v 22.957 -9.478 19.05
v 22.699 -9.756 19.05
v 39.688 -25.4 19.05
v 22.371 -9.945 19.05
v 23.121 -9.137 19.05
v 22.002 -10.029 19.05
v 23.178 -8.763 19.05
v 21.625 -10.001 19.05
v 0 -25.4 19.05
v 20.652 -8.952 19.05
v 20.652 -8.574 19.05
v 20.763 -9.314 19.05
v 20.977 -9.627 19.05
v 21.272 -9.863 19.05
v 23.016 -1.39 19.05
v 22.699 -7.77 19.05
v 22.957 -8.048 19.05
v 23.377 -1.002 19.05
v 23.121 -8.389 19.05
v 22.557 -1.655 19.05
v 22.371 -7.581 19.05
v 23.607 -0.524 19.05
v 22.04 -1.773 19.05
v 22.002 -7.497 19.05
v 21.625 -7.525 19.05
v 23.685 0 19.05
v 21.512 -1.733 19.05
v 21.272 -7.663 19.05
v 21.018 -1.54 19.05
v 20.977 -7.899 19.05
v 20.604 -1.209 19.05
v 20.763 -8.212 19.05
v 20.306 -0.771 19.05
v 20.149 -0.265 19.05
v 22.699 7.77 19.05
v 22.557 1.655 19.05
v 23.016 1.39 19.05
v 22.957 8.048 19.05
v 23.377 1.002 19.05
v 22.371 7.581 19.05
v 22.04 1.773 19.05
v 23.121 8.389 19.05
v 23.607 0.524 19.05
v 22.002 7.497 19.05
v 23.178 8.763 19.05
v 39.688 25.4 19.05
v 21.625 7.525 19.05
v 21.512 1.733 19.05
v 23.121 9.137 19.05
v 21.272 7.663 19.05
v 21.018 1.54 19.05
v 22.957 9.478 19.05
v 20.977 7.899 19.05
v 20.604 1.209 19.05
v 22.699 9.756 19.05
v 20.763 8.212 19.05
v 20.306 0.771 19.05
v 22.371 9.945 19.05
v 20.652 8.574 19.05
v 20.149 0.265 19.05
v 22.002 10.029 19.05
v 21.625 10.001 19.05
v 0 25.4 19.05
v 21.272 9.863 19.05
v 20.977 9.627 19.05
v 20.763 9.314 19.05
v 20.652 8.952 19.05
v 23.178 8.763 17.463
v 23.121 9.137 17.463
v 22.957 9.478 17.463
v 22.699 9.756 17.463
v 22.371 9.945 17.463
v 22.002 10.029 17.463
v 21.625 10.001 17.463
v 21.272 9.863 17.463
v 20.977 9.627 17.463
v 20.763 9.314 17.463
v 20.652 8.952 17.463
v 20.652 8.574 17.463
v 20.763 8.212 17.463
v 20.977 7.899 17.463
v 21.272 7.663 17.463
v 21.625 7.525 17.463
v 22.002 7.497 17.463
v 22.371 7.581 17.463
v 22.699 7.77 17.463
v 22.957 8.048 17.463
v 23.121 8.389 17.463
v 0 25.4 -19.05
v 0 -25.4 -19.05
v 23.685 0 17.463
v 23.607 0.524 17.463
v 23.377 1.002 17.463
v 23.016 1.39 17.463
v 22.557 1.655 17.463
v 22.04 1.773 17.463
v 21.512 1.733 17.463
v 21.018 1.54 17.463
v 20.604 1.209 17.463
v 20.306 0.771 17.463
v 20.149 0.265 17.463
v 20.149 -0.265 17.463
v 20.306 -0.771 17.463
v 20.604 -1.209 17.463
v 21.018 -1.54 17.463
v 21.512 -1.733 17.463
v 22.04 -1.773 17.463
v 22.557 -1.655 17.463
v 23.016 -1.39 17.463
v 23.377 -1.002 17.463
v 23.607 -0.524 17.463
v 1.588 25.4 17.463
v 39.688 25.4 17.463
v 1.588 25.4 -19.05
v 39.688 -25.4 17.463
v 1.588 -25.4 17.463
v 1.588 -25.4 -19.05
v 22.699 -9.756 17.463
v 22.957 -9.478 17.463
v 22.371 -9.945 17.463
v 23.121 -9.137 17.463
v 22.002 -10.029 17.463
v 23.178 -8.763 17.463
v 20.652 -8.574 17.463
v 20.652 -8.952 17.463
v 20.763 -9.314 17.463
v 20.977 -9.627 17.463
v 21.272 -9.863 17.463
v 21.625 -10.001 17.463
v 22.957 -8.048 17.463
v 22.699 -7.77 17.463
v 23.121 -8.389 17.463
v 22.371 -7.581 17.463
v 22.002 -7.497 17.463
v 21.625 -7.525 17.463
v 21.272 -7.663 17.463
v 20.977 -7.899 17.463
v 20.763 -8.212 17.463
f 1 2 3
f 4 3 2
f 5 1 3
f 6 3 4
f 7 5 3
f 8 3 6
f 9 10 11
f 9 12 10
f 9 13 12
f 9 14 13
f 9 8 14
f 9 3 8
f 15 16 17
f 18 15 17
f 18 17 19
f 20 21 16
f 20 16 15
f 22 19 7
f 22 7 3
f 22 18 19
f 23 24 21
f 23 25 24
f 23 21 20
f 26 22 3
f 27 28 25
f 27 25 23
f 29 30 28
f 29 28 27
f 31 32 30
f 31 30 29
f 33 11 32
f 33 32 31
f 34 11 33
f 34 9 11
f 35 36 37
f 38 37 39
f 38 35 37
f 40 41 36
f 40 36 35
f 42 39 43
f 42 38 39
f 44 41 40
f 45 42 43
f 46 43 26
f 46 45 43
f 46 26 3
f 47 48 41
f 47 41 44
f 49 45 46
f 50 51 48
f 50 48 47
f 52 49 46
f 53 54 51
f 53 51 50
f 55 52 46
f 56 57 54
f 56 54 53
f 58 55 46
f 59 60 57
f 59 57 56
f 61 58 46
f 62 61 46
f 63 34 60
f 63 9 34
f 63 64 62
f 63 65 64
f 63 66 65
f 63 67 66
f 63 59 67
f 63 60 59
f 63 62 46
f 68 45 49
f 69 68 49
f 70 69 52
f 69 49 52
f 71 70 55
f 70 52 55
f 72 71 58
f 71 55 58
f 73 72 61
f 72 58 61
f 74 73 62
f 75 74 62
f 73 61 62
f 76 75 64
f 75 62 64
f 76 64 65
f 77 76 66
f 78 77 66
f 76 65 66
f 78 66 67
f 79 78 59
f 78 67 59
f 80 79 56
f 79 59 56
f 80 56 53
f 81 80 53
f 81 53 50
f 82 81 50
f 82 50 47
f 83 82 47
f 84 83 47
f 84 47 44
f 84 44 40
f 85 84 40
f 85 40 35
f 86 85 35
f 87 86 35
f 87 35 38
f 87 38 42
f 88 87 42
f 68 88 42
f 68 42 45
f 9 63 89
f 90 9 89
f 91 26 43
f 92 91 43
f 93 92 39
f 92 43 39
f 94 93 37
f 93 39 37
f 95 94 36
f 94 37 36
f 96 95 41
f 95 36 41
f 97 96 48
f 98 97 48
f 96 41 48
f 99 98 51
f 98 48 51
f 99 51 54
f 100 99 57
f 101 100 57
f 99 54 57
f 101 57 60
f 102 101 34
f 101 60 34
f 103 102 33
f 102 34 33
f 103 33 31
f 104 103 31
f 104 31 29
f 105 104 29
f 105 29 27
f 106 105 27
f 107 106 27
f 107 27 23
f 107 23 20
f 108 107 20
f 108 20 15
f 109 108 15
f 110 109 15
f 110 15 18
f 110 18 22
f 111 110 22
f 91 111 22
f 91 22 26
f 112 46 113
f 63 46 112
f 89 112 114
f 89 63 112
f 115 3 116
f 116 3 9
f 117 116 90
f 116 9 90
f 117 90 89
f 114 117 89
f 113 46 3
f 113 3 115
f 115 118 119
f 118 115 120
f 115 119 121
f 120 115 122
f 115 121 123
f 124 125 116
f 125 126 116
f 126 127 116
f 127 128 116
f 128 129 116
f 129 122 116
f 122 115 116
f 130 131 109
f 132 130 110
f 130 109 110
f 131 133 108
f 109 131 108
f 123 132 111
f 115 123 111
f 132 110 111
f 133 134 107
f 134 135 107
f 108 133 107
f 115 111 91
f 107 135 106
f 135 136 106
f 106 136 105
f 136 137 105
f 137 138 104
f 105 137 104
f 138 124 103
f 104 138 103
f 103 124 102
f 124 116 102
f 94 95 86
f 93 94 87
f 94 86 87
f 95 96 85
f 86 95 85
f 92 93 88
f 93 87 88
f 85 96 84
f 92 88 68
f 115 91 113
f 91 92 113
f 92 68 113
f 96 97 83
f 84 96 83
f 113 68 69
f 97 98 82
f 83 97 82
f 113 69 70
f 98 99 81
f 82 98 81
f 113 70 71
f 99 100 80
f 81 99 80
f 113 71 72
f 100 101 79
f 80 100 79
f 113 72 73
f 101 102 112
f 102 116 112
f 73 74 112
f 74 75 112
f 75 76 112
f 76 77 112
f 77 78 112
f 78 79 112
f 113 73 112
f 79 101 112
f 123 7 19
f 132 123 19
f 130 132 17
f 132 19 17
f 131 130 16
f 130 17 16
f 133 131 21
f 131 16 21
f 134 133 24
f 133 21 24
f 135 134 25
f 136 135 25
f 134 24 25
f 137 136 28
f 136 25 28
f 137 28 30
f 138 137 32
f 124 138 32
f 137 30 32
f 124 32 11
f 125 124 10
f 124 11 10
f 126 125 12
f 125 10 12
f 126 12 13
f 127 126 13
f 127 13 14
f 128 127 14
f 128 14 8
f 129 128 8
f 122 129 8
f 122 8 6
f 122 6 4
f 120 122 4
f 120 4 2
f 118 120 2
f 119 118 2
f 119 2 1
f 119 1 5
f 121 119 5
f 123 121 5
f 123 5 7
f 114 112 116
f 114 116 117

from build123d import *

# Parameters (mm, degrees)
SKETCH2_W           = 38.1
SKETCH2_H           = 50.8
BOSS_EXTRUDE1_DEPTH = 1.5875
SKETCH3_W           = 1.5875
SKETCH3_H           = 50.8
BOSS_EXTRUDE2_DEPTH = 38.1
CUT_EXTRUDE1_REACH  = 62.596
SKETCH4_R           = 1.778
SKETCH4_R_2         = 1.27


with BuildPart() as part:
    # Sketch2 → Boss-Extrude1 (new body)
    with BuildSketch(Plane(origin=(0, 0, 0), x_dir=(0, 0, -1), z_dir=(1, 0, 0))):
        Rectangle(SKETCH2_W, SKETCH2_H)
    extrude(amount=BOSS_EXTRUDE1_DEPTH)

    # Sketch3 → Boss-Extrude2 (add)
    with BuildSketch(Plane(origin=(1.5875, 0, 0), x_dir=(0, 0, -1), z_dir=(1, 0, 0))):
        with Locations((-18.25625, 0)):
            Rectangle(SKETCH3_W, SKETCH3_H)
    extrude(amount=BOSS_EXTRUDE2_DEPTH)

    # Sketch4 → Cut-Extrude1 (cut, up to next)
    with BuildSketch(Plane.XY.offset(19.05), mode=Mode.PRIVATE) as cut_extrude1_sk1:
        with Locations((21.9075, 0)):
            Circle(SKETCH4_R)
    cut_extrude1_tool1 = extrude(cut_extrude1_sk1.sketch, amount=-CUT_EXTRUDE1_REACH, mode=Mode.PRIVATE) & part.part
    # Sketch4 → Cut-Extrude1 (cut, up to next)
    with BuildSketch(Plane.XY.offset(19.05), mode=Mode.PRIVATE) as cut_extrude1_sk2:
        with Locations((21.9075, 8.763)):
            Circle(SKETCH4_R_2)
    cut_extrude1_tool2 = extrude(cut_extrude1_sk2.sketch, amount=-CUT_EXTRUDE1_REACH, mode=Mode.PRIVATE) & part.part
    # Sketch4 → Cut-Extrude1 (cut, up to next)
    with BuildSketch(Plane.XY.offset(19.05), mode=Mode.PRIVATE) as cut_extrude1_sk3:
        with Locations((21.9075, -8.763)):
            Circle(SKETCH4_R_2)
    cut_extrude1_tool3 = extrude(cut_extrude1_sk3.sketch, amount=-CUT_EXTRUDE1_REACH, mode=Mode.PRIVATE) & part.part
    add(cut_extrude1_tool1.solids().sort_by_distance((21.9075, 0, 19.05))[0], mode=Mode.SUBTRACT)
    add(cut_extrude1_tool2.solids().sort_by_distance((21.9075, 8.763, 19.05))[0], mode=Mode.SUBTRACT)
    add(cut_extrude1_tool3.solids().sort_by_distance((21.9075, -8.763, 19.05))[0], mode=Mode.SUBTRACT)


solid = part.part
